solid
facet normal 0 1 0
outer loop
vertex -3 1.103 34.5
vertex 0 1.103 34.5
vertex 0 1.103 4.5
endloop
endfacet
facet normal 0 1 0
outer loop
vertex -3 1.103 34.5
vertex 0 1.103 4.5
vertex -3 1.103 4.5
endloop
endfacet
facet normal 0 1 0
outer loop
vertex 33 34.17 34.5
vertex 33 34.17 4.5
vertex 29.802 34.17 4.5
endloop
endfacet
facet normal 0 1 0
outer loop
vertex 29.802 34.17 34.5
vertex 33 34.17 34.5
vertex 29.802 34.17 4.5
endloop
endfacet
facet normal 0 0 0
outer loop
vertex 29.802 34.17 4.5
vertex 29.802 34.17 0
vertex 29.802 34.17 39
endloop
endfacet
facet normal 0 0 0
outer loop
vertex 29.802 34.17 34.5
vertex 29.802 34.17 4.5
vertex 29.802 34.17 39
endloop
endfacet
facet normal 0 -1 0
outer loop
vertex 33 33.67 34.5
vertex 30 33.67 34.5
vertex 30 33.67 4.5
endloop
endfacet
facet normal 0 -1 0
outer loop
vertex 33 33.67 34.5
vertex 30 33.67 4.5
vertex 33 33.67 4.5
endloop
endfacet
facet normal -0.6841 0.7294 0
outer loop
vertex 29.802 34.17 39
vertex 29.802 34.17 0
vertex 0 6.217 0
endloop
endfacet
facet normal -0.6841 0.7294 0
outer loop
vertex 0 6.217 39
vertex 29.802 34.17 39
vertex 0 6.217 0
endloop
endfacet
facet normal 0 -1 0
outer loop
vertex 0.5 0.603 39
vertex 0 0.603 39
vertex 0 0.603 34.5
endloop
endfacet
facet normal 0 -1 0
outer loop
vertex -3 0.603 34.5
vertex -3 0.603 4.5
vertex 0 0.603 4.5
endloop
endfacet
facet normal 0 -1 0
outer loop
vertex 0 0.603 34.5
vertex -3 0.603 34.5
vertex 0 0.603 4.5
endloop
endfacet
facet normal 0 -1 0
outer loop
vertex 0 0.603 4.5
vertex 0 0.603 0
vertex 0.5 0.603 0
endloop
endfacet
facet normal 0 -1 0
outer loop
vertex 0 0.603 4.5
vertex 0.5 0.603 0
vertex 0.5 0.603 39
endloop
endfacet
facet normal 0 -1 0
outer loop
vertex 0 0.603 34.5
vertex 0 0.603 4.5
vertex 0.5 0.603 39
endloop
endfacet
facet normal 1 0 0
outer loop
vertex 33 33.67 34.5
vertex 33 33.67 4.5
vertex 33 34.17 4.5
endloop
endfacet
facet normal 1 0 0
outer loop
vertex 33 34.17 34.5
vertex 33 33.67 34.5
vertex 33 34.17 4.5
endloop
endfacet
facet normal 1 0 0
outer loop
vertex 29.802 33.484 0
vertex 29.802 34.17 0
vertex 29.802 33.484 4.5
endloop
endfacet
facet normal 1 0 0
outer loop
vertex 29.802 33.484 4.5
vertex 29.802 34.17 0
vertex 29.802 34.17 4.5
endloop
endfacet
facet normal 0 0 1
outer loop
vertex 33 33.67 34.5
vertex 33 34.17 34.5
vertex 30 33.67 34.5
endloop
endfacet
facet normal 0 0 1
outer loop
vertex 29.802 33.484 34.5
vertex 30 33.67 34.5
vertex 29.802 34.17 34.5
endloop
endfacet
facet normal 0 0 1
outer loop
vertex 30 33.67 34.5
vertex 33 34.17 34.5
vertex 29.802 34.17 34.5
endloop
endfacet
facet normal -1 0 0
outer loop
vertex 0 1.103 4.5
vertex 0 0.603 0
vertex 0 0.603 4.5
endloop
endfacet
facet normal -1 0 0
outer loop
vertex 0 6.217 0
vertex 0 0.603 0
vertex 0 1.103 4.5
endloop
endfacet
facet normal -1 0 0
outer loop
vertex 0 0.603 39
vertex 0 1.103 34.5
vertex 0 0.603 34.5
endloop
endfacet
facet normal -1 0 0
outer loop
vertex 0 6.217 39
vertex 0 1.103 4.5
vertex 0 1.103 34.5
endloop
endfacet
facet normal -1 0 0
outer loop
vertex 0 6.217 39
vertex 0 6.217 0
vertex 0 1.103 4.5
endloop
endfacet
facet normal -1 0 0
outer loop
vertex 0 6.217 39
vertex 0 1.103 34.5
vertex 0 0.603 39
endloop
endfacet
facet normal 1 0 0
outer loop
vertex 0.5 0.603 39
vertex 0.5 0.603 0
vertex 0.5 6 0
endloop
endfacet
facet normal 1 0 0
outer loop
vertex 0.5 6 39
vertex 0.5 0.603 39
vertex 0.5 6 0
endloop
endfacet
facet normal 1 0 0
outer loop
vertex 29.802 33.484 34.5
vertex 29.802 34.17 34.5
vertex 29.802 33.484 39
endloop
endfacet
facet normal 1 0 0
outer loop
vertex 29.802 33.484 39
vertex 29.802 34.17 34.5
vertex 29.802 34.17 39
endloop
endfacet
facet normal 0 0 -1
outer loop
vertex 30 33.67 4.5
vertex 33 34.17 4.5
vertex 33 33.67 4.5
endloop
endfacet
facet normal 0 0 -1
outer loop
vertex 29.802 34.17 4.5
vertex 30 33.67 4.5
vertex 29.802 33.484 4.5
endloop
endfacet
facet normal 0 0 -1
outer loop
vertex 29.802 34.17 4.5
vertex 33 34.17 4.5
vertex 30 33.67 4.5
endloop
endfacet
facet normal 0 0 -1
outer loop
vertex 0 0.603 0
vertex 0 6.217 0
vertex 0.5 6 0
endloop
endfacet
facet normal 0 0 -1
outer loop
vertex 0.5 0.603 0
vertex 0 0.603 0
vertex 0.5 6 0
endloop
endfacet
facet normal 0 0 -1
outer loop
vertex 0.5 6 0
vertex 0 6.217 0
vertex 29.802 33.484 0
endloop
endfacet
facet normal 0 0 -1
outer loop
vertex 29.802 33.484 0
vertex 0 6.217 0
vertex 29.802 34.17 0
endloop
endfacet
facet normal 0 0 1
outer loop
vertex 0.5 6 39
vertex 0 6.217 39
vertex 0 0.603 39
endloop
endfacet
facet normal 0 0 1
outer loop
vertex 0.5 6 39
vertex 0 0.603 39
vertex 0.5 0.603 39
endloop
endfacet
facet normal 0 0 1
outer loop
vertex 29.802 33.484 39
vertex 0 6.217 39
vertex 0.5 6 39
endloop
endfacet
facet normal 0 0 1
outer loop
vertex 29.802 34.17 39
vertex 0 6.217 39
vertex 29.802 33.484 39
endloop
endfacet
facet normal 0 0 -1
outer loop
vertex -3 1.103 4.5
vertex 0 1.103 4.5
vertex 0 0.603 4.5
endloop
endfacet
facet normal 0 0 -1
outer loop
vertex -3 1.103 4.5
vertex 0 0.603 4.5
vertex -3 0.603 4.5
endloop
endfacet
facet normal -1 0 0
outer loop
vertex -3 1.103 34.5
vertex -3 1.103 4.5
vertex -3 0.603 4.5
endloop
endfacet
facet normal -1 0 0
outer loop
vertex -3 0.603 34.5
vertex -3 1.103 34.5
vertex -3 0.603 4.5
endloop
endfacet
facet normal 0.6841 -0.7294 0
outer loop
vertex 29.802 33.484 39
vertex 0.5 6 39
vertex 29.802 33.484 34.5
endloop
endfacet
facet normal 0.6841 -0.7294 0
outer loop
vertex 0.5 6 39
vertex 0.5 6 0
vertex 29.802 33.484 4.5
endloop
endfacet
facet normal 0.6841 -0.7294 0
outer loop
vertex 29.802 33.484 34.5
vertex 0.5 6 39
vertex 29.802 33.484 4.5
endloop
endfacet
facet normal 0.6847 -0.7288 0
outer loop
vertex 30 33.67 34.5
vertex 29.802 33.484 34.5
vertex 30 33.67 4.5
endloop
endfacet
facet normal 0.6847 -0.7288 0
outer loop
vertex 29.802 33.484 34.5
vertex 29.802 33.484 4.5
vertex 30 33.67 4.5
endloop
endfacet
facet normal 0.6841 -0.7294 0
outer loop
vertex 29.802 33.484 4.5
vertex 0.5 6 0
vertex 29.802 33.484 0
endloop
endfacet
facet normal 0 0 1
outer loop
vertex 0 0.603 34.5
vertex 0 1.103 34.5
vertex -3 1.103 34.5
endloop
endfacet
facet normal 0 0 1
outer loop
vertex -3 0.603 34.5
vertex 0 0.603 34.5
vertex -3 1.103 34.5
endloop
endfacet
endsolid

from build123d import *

# Parameters (mm, degrees)
F1_DEPTH = 39
F2_W     = 3
F2_H     = 4.5
F3_DEPTH = 0.5
F4_W     = 3.197795
F4_H     = 4.5
F5_DEPTH = 1


with BuildPart() as f1:
    # F0 (on Top) → F1 (new body)
    with BuildSketch(Plane.XY):
        Polygon((-3, 0.603), (0.5, 0.603), (0.5, 6), (30, 33.67), (33, 33.67), (33, 34.17), (29.802205, 34.17), (0, 6.216542), (0, 1.103), (-3, 1.103), align=None)
    extrude(amount=F1_DEPTH)

    # F2 (on face) → F3 (cut, through all)
    with BuildSketch(Plane(origin=(0, 1.103, 0), x_dir=(-1, 0, 0), z_dir=(0, 1, 0))):
        with Locations((1.5, 2.25)):
            Rectangle(F2_W, F2_H)
        with Locations((1.5, 36.75)):
            Rectangle(F2_W, F2_H)
    extrude(amount=-F3_DEPTH, mode=Mode.SUBTRACT)

    # F4 (on face) → F5 (cut)
    with BuildSketch(Plane(origin=(0, 34.17, 0), x_dir=(-1, 0, 0), z_dir=(0, 1, 0))):
        with Locations((-31.401103, 36.75)):
            Rectangle(F4_W, F4_H)
        with Locations((-31.401103, 2.25)):
            Rectangle(F4_W, F4_H)
    extrude(amount=-F5_DEPTH, mode=Mode.SUBTRACT)


solid = f1.part
